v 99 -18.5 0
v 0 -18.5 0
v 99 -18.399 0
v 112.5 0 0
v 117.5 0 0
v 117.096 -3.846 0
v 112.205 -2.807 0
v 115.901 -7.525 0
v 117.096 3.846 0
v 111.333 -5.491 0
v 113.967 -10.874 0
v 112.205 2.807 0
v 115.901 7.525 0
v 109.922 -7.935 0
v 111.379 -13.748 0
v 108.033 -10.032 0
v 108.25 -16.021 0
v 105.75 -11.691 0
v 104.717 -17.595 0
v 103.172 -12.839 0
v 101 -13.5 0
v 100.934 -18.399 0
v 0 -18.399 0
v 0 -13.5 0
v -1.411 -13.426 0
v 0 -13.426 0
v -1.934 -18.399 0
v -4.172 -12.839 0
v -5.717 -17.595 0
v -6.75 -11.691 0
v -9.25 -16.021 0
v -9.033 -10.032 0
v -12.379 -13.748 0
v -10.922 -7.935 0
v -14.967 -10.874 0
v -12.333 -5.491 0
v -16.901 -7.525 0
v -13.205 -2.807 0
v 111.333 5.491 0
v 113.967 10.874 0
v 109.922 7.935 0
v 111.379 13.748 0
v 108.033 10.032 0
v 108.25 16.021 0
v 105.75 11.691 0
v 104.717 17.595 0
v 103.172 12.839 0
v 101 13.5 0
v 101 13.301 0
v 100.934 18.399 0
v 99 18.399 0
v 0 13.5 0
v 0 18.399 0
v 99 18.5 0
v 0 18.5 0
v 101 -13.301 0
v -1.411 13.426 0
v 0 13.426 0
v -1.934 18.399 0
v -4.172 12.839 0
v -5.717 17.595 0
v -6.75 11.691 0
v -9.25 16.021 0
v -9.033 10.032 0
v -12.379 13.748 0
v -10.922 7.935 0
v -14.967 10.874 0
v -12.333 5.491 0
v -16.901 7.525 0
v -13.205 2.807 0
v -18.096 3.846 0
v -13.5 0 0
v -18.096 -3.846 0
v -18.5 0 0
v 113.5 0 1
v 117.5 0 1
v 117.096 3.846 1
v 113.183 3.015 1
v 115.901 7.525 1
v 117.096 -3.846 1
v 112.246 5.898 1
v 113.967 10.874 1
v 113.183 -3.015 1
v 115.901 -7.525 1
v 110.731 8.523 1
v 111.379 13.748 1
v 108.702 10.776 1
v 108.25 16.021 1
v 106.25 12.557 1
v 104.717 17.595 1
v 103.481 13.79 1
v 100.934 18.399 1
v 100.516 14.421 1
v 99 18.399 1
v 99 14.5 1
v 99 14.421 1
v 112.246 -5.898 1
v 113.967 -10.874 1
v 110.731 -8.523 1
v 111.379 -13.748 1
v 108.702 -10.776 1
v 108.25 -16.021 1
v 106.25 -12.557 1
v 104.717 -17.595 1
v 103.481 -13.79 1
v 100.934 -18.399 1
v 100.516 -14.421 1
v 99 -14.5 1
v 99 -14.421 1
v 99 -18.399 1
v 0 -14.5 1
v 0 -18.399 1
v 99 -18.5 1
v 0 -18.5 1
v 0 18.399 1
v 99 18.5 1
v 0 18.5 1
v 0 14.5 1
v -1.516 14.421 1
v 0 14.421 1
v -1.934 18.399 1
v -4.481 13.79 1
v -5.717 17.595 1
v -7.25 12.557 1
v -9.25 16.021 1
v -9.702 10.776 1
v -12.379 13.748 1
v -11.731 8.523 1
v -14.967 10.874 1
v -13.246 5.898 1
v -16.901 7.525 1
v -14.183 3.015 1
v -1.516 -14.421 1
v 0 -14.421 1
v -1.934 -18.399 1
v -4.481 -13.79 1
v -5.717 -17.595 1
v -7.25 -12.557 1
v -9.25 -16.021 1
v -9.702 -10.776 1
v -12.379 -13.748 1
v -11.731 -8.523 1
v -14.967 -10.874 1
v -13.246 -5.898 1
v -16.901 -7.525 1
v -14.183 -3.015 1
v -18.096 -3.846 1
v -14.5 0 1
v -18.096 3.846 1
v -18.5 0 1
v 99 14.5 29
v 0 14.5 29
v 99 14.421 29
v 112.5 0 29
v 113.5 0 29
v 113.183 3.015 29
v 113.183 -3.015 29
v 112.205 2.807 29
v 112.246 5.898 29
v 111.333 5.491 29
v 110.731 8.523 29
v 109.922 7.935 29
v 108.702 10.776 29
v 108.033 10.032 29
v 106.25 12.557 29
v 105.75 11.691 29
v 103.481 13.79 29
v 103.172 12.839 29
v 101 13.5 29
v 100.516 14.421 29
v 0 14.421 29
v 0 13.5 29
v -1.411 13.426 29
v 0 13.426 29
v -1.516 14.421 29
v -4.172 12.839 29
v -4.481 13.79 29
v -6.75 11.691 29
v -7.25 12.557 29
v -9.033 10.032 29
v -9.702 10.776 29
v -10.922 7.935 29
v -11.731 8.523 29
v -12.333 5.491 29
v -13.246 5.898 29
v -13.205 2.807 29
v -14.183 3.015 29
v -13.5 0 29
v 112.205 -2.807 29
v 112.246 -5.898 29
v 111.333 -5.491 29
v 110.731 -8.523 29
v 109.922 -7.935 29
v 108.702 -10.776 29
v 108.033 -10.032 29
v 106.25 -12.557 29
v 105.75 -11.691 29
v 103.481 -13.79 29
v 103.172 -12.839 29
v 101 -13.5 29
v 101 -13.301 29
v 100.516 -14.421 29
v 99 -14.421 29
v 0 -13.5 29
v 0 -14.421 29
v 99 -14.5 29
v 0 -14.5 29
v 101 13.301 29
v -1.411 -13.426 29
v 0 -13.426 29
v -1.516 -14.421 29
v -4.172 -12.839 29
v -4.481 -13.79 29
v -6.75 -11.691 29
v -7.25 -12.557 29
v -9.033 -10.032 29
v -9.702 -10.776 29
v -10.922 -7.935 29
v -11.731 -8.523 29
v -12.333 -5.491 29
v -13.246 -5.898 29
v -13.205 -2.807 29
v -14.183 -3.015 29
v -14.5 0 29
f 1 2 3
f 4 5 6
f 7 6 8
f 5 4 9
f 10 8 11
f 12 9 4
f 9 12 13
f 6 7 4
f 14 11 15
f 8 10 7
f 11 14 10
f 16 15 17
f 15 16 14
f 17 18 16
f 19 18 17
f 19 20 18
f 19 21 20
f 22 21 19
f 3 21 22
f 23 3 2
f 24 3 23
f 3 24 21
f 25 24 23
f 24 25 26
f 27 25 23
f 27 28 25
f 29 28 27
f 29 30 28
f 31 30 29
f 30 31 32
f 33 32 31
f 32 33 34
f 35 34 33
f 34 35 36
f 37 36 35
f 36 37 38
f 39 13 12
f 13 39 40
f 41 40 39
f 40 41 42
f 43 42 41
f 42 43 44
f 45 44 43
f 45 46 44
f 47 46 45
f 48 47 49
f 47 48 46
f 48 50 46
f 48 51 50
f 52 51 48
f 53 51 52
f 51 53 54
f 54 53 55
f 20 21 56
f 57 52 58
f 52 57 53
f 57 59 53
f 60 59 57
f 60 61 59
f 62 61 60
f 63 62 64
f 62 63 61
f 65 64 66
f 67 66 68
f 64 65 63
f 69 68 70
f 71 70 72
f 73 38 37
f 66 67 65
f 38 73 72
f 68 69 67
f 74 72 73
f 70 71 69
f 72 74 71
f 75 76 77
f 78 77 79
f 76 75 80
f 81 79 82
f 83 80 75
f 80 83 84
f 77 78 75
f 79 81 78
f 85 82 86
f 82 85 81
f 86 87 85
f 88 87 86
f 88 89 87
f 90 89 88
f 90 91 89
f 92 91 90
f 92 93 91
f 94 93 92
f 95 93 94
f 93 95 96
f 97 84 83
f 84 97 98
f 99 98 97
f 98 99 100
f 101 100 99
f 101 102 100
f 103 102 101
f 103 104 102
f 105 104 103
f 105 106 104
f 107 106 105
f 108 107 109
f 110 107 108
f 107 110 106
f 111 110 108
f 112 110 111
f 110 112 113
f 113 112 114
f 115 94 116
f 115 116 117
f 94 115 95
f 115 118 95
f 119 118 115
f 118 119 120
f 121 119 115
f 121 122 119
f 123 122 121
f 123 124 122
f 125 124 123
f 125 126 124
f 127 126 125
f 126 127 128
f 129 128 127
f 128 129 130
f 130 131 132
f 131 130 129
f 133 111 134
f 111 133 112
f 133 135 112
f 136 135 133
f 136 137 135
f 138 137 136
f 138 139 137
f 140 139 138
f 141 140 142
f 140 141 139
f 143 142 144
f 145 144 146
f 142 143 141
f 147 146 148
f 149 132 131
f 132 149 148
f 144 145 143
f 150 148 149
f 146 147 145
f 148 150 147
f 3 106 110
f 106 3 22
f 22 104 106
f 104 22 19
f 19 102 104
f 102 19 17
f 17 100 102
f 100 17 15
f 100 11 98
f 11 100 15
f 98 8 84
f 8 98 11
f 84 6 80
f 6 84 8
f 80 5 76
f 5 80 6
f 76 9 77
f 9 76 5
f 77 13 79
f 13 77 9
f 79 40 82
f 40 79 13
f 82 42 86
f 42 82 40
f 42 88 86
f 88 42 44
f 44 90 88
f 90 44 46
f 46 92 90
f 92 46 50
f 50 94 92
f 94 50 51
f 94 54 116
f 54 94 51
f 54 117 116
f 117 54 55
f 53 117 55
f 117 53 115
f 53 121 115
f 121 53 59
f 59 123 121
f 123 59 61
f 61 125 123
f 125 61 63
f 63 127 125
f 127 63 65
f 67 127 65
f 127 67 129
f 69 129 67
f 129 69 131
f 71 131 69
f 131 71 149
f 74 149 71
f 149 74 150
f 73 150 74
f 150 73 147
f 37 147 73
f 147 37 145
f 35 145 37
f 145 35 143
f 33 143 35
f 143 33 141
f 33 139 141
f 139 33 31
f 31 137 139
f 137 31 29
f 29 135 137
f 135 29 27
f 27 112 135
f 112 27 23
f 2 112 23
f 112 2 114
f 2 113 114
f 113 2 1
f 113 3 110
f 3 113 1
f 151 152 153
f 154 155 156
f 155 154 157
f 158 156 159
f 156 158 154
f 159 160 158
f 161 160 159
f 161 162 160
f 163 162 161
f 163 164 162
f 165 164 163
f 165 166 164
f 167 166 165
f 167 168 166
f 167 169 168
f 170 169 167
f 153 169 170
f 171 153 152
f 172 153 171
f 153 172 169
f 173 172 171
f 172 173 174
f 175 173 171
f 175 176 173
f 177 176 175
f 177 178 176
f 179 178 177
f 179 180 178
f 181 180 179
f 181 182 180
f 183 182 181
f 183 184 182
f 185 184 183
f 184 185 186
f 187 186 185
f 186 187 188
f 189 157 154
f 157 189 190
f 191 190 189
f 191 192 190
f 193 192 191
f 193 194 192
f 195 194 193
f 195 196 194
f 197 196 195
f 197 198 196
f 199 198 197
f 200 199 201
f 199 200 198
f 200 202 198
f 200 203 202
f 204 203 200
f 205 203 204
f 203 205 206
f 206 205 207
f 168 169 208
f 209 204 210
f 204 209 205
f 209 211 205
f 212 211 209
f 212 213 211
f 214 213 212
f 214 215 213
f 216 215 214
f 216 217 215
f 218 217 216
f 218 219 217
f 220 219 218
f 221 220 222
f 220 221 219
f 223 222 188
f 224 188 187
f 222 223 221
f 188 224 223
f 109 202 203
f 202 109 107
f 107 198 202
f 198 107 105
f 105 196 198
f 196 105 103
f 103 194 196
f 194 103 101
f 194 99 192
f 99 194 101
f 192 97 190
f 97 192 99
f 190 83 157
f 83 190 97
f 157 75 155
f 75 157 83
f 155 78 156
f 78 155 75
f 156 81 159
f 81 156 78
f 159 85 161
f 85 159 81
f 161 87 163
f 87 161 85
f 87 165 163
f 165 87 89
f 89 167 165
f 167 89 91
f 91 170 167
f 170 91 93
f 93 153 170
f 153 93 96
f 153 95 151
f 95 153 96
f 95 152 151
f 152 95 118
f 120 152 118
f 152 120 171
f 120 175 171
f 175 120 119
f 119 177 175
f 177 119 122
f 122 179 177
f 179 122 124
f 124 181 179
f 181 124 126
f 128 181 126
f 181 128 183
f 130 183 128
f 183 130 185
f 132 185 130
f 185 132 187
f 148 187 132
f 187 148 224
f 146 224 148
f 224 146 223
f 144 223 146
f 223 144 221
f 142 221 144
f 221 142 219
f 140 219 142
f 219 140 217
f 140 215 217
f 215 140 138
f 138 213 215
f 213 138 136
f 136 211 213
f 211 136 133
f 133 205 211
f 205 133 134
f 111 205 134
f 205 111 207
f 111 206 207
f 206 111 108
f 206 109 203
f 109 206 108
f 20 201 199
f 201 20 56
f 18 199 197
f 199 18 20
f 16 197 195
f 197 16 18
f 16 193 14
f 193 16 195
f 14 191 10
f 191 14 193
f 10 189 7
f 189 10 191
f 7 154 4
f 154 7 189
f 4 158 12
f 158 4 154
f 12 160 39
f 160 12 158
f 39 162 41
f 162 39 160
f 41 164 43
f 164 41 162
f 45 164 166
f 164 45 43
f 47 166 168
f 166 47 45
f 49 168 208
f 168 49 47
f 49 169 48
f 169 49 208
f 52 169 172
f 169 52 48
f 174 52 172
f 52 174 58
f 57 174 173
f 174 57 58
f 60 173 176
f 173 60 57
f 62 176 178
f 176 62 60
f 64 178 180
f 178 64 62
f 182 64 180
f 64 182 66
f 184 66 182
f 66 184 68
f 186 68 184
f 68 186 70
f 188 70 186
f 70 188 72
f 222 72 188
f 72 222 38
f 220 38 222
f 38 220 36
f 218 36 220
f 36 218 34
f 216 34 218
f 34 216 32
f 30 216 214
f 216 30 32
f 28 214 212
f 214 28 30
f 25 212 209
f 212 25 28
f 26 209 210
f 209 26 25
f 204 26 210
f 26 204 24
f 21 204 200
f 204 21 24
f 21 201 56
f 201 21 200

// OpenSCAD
grommet_height=29;
grommet_width=128;
grommet_depth=30;
brim_width=8;
grommet_penetration_thickness=2;

//module grommet(height, width, depth)
module grommet(ovaldia, totalwidth, gdepth)
{

      difference()
        {
        //rim
        union()
        {
            linear_extrude(1)
            {
                union()
                {
                    
                    //translate([0,ovaldia/2,0])
                    //{
                        circle(d=ovaldia+brim_width);
                    //}
                    translate([0,-(ovaldia+brim_width)/2,0])
                    {
                        square([totalwidth-(ovaldia),ovaldia+brim_width],center=false);
                    }
                    translate([totalwidth-(ovaldia),0,0])
                    {
                        circle(d=ovaldia+brim_width);
                    }
                }
            }
            linear_extrude(gdepth-1)
            {
                union()
                {
                    translate([0,0,0])
                    {
                        circle(d=ovaldia);
                        translate([0,-((ovaldia)/2),0])
                        {
                            square([totalwidth-ovaldia,ovaldia],center=false);
                        }
                        translate([totalwidth-ovaldia,0,0])
                        {
                            circle(d=ovaldia);
                        
                        }  
                    }
                }  
            }
        }   
            //hole
            linear_extrude(gdepth)
            {
                union()
                {
                    //translate([0,ovaldia/2,0])
                    //{
                        circle(d=ovaldia-grommet_penetration_thickness);
                    //}
                    translate([0,-(ovaldia-grommet_penetration_thickness)/2,0])
                    {
                        square([totalwidth-(ovaldia-grommet_penetration_thickness),ovaldia-grommet_penetration_thickness],center=false);
                    }
                    translate([totalwidth-ovaldia,0,0])
                    {
                        circle(d=ovaldia-grommet_penetration_thickness);
                    }
                }
            }
        }

}

grommet(grommet_height, grommet_width, grommet_depth);
